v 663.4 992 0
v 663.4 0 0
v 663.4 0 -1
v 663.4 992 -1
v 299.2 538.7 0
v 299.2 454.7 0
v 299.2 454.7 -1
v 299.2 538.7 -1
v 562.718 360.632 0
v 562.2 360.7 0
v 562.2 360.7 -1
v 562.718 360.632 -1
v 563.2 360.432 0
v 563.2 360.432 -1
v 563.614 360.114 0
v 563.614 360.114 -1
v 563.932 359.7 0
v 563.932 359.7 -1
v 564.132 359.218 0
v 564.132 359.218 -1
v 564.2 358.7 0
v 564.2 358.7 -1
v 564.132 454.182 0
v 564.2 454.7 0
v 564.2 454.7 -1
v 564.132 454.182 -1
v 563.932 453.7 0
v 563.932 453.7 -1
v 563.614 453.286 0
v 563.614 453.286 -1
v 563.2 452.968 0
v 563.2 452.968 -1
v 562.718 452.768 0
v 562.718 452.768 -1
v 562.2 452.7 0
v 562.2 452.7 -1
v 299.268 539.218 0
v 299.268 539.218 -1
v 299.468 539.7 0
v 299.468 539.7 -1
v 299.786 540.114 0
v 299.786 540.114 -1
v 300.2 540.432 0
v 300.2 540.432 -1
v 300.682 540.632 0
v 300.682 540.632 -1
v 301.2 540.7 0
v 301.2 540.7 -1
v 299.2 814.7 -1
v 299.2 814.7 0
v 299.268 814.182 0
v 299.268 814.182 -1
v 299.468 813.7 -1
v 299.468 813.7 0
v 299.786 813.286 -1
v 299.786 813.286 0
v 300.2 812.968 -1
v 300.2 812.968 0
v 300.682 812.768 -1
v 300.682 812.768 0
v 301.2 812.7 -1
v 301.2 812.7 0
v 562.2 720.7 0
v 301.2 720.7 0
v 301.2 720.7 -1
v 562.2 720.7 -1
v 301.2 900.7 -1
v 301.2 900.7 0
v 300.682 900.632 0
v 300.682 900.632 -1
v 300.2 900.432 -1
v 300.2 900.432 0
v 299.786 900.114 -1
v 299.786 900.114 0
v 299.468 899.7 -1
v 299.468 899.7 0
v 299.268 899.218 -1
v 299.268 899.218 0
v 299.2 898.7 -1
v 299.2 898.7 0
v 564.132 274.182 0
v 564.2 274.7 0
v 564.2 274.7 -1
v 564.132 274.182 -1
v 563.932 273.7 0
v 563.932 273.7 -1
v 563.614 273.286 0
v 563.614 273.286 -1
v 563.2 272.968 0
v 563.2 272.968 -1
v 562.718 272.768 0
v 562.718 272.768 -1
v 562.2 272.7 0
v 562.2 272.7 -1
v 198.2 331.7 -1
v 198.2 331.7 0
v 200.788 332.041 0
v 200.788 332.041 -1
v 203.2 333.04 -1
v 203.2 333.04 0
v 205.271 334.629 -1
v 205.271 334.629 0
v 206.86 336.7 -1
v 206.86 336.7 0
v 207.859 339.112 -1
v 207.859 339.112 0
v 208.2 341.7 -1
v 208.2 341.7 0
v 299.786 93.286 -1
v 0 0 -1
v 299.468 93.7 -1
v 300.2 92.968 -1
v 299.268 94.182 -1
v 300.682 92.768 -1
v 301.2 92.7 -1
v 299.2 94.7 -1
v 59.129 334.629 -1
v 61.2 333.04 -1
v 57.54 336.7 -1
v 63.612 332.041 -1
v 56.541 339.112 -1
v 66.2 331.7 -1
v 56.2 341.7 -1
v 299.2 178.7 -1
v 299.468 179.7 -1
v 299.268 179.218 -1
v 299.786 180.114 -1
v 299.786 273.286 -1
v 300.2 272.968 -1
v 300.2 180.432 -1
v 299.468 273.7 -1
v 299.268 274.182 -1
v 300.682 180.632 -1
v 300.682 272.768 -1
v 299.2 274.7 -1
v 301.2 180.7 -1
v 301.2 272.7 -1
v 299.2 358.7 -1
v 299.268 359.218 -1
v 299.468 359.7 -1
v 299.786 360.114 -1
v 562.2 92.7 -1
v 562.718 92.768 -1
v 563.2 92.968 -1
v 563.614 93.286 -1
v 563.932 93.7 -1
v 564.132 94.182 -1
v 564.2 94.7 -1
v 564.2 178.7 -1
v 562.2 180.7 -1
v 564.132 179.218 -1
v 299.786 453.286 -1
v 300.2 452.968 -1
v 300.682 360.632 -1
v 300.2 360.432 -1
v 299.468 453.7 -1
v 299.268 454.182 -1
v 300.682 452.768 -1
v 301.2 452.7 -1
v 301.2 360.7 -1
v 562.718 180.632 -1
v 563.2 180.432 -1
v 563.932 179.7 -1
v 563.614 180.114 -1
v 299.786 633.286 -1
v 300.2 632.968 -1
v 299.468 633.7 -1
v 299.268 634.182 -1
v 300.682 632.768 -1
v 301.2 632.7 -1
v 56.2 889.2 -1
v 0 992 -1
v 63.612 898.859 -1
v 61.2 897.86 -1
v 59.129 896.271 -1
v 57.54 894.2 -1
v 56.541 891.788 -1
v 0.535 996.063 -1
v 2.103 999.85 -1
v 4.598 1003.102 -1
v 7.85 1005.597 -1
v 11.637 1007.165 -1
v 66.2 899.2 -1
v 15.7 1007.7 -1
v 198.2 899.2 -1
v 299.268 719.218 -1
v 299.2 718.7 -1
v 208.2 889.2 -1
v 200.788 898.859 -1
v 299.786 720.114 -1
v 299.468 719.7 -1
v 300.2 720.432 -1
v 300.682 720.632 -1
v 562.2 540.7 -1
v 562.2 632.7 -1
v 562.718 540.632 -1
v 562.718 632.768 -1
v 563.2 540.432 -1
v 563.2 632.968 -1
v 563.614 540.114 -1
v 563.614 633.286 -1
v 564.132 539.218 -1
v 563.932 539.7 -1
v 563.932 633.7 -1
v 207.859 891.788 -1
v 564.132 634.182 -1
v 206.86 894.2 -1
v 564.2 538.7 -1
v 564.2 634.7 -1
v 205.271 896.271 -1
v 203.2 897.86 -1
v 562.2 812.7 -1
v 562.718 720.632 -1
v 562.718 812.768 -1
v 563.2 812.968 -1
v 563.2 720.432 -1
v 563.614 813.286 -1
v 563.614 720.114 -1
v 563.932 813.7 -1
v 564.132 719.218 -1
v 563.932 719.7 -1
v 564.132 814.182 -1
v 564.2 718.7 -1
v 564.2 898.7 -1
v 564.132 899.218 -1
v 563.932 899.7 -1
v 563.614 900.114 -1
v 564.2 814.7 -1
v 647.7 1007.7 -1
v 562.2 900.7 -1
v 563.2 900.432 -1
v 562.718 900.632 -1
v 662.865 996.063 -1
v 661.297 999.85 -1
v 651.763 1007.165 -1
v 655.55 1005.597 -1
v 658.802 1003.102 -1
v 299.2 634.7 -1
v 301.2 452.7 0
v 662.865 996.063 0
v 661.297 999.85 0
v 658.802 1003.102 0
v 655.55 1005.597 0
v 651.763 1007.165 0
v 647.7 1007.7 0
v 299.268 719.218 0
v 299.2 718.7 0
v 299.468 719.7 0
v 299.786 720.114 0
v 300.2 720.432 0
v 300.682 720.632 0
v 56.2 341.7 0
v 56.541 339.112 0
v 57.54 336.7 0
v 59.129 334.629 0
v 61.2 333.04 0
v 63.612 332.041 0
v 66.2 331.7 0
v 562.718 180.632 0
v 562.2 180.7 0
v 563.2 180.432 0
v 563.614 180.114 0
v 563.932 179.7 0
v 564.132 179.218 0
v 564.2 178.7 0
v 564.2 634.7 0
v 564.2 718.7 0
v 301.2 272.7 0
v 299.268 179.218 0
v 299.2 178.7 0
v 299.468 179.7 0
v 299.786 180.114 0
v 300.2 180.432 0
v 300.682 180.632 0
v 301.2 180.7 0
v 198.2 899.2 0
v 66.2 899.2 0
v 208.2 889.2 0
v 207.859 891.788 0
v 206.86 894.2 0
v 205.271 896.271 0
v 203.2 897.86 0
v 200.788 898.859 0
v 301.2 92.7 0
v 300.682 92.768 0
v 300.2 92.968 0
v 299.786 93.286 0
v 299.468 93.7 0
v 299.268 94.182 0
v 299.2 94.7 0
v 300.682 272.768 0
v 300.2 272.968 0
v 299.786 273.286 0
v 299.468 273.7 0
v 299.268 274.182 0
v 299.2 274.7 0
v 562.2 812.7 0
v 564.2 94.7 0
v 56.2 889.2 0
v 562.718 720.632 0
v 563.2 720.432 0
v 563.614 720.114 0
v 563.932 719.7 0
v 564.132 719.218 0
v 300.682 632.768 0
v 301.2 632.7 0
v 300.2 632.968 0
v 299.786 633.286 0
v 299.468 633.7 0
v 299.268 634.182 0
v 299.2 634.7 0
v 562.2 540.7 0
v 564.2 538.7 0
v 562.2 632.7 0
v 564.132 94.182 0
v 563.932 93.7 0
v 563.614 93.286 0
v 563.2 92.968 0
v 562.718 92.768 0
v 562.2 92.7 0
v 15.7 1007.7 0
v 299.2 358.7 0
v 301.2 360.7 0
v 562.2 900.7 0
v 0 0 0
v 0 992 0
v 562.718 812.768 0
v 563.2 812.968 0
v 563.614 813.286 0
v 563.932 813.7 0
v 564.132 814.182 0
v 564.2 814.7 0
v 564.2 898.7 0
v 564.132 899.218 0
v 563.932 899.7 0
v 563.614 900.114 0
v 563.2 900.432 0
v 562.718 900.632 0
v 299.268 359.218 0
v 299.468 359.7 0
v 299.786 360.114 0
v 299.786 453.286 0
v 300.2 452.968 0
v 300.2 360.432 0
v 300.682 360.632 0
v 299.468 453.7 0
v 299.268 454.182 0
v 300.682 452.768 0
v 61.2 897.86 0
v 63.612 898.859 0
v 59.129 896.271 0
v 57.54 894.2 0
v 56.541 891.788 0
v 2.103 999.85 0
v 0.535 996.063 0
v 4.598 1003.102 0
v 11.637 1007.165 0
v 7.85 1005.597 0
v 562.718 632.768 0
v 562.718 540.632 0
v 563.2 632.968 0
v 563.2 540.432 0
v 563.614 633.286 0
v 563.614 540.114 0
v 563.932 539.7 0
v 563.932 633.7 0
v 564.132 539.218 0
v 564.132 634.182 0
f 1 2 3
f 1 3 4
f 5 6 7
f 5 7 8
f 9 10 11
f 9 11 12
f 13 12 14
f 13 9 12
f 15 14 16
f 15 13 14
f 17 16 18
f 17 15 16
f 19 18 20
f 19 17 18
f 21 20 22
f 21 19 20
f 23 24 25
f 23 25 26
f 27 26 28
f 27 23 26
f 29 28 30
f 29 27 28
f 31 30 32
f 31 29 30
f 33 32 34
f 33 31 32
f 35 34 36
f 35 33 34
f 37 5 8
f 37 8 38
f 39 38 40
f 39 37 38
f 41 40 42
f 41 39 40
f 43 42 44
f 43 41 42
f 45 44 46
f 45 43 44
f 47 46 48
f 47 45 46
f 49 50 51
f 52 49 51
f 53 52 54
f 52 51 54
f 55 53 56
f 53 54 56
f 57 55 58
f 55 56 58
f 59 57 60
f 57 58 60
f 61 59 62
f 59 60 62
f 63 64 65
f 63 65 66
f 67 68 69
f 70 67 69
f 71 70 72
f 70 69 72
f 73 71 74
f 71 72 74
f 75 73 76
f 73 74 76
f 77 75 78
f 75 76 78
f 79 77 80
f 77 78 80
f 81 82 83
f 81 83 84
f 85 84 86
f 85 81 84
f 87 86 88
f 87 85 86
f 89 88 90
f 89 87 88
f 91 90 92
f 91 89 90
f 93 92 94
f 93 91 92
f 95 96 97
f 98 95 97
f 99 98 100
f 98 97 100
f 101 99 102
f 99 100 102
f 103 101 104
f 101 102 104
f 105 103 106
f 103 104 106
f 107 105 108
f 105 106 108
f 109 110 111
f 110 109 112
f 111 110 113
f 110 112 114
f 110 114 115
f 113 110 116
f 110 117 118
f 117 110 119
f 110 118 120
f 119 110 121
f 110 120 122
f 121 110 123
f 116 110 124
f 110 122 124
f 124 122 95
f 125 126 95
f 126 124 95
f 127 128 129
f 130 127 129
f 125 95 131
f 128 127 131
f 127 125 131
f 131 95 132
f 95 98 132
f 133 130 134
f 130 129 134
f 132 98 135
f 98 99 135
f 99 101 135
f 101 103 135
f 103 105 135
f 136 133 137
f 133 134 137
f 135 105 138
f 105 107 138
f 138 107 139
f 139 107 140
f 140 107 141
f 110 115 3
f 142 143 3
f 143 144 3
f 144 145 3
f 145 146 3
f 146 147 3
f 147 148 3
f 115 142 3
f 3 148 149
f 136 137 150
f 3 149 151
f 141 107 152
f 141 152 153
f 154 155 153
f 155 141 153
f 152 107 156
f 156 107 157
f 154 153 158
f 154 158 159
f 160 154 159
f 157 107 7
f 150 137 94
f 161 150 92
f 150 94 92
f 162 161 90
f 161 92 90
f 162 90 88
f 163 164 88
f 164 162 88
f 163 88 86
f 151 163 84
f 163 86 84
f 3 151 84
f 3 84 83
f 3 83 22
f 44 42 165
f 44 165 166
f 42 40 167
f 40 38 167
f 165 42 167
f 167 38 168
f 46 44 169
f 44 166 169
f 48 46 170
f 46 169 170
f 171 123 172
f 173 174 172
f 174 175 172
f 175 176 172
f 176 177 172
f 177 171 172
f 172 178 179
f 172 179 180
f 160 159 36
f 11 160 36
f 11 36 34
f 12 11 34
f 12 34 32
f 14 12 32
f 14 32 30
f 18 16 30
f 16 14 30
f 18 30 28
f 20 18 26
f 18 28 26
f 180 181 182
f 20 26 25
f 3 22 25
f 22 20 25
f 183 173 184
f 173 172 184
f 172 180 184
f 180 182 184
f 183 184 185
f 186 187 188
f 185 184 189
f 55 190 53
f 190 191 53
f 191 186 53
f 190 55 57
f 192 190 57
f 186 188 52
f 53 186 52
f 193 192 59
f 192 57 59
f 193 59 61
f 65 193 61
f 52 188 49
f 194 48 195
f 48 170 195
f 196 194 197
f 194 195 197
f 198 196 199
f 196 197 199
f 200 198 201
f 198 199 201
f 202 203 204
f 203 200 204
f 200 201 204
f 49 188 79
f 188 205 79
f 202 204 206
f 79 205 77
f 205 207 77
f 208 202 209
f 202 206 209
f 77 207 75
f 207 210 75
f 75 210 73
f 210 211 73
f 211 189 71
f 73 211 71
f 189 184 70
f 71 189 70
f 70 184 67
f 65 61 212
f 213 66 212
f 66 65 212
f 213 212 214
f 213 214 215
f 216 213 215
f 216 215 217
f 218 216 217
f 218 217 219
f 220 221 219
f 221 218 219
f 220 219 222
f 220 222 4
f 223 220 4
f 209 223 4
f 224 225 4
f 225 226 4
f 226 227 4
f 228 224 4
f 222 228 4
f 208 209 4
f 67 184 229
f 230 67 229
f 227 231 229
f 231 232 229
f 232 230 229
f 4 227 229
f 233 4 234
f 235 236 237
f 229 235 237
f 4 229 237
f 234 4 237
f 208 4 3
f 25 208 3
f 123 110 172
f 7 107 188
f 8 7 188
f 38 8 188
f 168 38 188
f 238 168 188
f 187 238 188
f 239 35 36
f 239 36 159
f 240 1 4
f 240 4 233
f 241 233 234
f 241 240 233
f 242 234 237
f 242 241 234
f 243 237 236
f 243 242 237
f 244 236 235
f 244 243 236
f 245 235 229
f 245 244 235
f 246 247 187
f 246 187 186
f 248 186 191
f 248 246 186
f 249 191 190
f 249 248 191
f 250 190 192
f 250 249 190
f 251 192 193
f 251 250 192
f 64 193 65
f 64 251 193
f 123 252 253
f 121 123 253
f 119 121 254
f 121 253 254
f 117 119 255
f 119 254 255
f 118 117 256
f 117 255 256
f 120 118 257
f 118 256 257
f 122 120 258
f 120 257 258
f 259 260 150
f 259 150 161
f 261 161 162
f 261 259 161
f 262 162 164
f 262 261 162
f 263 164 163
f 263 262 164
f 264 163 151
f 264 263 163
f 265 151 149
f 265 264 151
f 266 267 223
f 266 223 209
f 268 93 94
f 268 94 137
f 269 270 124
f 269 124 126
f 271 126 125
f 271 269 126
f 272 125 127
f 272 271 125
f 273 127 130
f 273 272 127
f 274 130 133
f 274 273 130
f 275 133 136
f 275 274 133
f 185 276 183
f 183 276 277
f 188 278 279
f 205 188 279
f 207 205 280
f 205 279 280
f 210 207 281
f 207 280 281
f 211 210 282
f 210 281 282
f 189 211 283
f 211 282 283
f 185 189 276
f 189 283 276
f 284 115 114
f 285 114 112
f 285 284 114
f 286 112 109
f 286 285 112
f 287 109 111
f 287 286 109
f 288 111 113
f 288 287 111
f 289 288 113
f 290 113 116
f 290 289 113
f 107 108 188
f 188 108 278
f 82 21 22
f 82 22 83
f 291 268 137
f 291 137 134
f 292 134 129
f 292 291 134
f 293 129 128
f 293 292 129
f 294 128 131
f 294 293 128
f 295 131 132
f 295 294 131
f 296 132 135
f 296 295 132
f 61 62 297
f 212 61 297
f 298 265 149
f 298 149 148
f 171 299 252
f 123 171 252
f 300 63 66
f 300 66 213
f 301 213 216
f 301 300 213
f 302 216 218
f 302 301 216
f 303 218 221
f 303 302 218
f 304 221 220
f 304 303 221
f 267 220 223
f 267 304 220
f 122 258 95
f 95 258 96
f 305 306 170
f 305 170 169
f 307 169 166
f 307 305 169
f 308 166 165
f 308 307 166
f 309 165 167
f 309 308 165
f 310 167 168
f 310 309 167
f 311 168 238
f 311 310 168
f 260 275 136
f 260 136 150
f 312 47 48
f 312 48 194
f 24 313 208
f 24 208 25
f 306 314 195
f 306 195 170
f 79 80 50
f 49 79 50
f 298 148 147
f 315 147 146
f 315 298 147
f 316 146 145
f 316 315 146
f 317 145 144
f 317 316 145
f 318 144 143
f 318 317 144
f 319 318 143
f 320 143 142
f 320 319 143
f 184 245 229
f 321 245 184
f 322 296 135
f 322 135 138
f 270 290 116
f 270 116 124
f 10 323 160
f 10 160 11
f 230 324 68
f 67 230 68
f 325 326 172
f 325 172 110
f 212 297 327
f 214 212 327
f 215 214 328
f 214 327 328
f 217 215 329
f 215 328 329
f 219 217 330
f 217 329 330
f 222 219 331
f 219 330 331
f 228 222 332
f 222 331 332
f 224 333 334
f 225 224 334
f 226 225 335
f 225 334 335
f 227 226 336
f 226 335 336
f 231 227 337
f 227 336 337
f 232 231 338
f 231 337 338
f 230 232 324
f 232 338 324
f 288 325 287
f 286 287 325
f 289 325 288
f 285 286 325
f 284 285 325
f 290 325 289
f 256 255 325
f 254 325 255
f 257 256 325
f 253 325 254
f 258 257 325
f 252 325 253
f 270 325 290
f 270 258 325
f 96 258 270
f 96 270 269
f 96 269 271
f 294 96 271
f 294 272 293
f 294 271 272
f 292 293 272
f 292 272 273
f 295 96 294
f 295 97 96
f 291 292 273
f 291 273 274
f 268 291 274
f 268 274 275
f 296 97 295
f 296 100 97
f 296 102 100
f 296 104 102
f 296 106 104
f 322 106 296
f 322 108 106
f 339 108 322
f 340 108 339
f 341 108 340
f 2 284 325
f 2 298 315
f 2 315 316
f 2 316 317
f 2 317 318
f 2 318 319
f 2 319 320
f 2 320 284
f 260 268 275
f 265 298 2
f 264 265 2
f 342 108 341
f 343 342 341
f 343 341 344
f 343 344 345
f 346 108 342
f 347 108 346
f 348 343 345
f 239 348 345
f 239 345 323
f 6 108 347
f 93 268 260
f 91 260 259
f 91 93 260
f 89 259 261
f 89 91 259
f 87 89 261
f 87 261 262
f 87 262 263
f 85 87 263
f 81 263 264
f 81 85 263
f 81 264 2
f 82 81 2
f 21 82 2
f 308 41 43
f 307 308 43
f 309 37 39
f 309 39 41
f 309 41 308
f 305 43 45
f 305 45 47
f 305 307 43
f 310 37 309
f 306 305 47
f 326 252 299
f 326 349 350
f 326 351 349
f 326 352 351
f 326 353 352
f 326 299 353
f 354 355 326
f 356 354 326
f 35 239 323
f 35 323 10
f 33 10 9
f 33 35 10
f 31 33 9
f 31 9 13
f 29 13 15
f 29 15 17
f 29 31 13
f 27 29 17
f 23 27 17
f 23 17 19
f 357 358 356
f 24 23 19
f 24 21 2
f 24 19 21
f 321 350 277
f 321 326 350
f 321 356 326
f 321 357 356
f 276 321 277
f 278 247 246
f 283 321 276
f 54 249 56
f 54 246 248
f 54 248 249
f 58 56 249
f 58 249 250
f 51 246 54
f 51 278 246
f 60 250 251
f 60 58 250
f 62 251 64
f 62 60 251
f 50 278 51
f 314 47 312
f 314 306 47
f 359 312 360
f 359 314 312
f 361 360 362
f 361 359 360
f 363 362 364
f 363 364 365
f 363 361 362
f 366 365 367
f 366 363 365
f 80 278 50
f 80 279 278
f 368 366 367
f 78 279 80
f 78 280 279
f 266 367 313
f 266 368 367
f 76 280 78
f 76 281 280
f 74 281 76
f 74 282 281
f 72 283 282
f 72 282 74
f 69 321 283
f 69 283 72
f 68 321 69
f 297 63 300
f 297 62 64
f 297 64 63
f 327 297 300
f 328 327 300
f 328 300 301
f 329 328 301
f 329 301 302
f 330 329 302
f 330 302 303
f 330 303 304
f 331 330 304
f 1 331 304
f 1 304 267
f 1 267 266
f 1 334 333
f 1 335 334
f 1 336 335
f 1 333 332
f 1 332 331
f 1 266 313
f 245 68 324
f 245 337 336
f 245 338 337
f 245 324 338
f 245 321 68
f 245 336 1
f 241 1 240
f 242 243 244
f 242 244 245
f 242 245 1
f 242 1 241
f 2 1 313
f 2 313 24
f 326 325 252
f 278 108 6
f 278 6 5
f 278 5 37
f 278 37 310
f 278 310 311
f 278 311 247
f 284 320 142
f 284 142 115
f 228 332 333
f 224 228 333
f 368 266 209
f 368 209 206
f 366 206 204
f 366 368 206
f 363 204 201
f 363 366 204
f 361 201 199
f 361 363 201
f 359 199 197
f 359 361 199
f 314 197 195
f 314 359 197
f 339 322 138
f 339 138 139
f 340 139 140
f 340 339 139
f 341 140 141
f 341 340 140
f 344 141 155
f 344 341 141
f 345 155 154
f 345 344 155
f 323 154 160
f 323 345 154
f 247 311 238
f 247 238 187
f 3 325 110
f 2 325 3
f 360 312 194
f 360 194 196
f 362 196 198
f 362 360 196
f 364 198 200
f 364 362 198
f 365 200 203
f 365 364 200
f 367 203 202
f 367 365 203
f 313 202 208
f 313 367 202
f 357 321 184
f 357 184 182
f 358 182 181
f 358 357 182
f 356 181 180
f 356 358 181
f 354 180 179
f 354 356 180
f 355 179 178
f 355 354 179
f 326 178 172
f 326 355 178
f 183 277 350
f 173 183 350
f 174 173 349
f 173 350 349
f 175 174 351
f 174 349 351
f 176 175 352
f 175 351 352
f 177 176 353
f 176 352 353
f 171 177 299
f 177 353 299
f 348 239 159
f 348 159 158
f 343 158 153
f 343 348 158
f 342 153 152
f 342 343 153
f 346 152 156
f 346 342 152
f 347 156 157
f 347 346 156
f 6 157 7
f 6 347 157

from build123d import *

# Parameters (mm, degrees)
BASE_FLANGE1_DEPTH = 1
CUT_EXTRUDE1_DEPTH = 10
CUT_EXTRUDE2_DEPTH = 10


# Sheet-metal steps are written as plain solids
with BuildPart() as part:
    # Sketch1 → Base-Flange1 (new body)
    with BuildSketch(Plane.XY):
        with BuildLine():
            Line((0, 0), (663.4, 0))
            Line((663.4, 0), (663.4, 992))
            ThreePointArc((663.4, 992), (658.801576465, 1003.101576465), (647.7, 1007.7))
            Line((647.7, 1007.7), (15.7, 1007.7))
            ThreePointArc((15.7, 1007.7), (4.598423535, 1003.101576465), (0, 992))
            Line((0, 992), (0, 0))
        make_face()
    extrude(amount=-BASE_FLANGE1_DEPTH)

    # Sketch9 → Cut-Extrude1 (cut)
    with BuildSketch(Plane.XY):
        with BuildLine():
            Line((562.2, 900.7), (301.2, 900.7))
            ThreePointArc((301.2, 900.7), (299.785786438, 900.114213562), (299.2, 898.7))
            Line((299.2, 898.7), (299.2, 814.7))
            ThreePointArc((299.2, 814.7), (299.785786438, 813.285786438), (301.2, 812.7))
            Line((301.2, 812.7), (562.2, 812.7))
            ThreePointArc((562.2, 812.7), (563.614213562, 813.285786438), (564.2, 814.7))
            Line((564.2, 814.7), (564.2, 898.7))
            ThreePointArc((564.2, 898.7), (563.614213562, 900.114213562), (562.2, 900.7))
        make_face()
        with BuildLine():
            Line((564.2, 718.7), (564.2, 634.7))
            ThreePointArc((564.2, 634.7), (563.614213562, 633.285786438), (562.2, 632.7))
            Line((562.2, 632.7), (301.2, 632.7))
            ThreePointArc((301.2, 632.7), (299.785786438, 633.285786438), (299.2, 634.7))
            Line((299.2, 634.7), (299.2, 718.7))
            ThreePointArc((299.2, 718.7), (299.785786438, 720.114213562), (301.2, 720.7))
            Line((301.2, 720.7), (562.2, 720.7))
            ThreePointArc((562.2, 720.7), (563.614213562, 720.114213562), (564.2, 718.7))
        make_face()
        with BuildLine():
            Line((564.2, 538.7), (564.2, 454.7))
            ThreePointArc((564.2, 454.7), (563.614213562, 453.285786438), (562.2, 452.7))
            Line((562.2, 452.7), (301.2, 452.7))
            ThreePointArc((301.2, 452.7), (299.785786438, 453.285786438), (299.2, 454.7))
            Line((299.2, 454.7), (299.2, 538.7))
            ThreePointArc((299.2, 538.7), (299.785786438, 540.114213562), (301.2, 540.7))
            Line((301.2, 540.7), (562.2, 540.7))
            ThreePointArc((562.2, 540.7), (563.614213562, 540.114213562), (564.2, 538.7))
        make_face()
        with BuildLine():
            Line((564.2, 358.7), (564.2, 274.7))
            ThreePointArc((564.2, 274.7), (563.614213562, 273.285786438), (562.2, 272.7))
            Line((562.2, 272.7), (301.2, 272.7))
            ThreePointArc((301.2, 272.7), (299.785786438, 273.285786438), (299.2, 274.7))
            Line((299.2, 274.7), (299.2, 358.7))
            ThreePointArc((299.2, 358.7), (299.785786438, 360.114213562), (301.2, 360.7))
            Line((301.2, 360.7), (562.2, 360.7))
            ThreePointArc((562.2, 360.7), (563.614213562, 360.114213562), (564.2, 358.7))
        make_face()
        with BuildLine():
            Line((564.2, 178.7), (564.2, 94.7))
            ThreePointArc((564.2, 94.7), (563.614213562, 93.285786438), (562.2, 92.7))
            Line((562.2, 92.7), (301.2, 92.7))
            ThreePointArc((301.2, 92.7), (299.785786438, 93.285786438), (299.2, 94.7))
            Line((299.2, 94.7), (299.2, 178.7))
            ThreePointArc((299.2, 178.7), (299.785786438, 180.114213562), (301.2, 180.7))
            Line((301.2, 180.7), (562.2, 180.7))
            ThreePointArc((562.2, 180.7), (563.614213562, 180.114213562), (564.2, 178.7))
        make_face()
    extrude(amount=-CUT_EXTRUDE1_DEPTH, mode=Mode.SUBTRACT)

    # Sketch10 → Cut-Extrude2 (cut)
    with BuildSketch(Plane.XY):
        with BuildLine():
            Line((66.2, 331.7), (198.2, 331.7))
            ThreePointArc((198.2, 331.7), (205.271067812, 334.628932188), (208.2, 341.7))
            Line((208.2, 341.7), (208.2, 889.2))
            ThreePointArc((208.2, 889.2), (205.271067812, 896.271067812), (198.2, 899.2))
            Line((198.2, 899.2), (66.2, 899.2))
            ThreePointArc((66.2, 899.2), (59.128932188, 896.271067812), (56.2, 889.2))
            Line((56.2, 889.2), (56.2, 341.7))
            ThreePointArc((56.2, 341.7), (59.128932188, 334.628932188), (66.2, 331.7))
        make_face()
    extrude(amount=-CUT_EXTRUDE2_DEPTH, mode=Mode.SUBTRACT)


solid = part.part
